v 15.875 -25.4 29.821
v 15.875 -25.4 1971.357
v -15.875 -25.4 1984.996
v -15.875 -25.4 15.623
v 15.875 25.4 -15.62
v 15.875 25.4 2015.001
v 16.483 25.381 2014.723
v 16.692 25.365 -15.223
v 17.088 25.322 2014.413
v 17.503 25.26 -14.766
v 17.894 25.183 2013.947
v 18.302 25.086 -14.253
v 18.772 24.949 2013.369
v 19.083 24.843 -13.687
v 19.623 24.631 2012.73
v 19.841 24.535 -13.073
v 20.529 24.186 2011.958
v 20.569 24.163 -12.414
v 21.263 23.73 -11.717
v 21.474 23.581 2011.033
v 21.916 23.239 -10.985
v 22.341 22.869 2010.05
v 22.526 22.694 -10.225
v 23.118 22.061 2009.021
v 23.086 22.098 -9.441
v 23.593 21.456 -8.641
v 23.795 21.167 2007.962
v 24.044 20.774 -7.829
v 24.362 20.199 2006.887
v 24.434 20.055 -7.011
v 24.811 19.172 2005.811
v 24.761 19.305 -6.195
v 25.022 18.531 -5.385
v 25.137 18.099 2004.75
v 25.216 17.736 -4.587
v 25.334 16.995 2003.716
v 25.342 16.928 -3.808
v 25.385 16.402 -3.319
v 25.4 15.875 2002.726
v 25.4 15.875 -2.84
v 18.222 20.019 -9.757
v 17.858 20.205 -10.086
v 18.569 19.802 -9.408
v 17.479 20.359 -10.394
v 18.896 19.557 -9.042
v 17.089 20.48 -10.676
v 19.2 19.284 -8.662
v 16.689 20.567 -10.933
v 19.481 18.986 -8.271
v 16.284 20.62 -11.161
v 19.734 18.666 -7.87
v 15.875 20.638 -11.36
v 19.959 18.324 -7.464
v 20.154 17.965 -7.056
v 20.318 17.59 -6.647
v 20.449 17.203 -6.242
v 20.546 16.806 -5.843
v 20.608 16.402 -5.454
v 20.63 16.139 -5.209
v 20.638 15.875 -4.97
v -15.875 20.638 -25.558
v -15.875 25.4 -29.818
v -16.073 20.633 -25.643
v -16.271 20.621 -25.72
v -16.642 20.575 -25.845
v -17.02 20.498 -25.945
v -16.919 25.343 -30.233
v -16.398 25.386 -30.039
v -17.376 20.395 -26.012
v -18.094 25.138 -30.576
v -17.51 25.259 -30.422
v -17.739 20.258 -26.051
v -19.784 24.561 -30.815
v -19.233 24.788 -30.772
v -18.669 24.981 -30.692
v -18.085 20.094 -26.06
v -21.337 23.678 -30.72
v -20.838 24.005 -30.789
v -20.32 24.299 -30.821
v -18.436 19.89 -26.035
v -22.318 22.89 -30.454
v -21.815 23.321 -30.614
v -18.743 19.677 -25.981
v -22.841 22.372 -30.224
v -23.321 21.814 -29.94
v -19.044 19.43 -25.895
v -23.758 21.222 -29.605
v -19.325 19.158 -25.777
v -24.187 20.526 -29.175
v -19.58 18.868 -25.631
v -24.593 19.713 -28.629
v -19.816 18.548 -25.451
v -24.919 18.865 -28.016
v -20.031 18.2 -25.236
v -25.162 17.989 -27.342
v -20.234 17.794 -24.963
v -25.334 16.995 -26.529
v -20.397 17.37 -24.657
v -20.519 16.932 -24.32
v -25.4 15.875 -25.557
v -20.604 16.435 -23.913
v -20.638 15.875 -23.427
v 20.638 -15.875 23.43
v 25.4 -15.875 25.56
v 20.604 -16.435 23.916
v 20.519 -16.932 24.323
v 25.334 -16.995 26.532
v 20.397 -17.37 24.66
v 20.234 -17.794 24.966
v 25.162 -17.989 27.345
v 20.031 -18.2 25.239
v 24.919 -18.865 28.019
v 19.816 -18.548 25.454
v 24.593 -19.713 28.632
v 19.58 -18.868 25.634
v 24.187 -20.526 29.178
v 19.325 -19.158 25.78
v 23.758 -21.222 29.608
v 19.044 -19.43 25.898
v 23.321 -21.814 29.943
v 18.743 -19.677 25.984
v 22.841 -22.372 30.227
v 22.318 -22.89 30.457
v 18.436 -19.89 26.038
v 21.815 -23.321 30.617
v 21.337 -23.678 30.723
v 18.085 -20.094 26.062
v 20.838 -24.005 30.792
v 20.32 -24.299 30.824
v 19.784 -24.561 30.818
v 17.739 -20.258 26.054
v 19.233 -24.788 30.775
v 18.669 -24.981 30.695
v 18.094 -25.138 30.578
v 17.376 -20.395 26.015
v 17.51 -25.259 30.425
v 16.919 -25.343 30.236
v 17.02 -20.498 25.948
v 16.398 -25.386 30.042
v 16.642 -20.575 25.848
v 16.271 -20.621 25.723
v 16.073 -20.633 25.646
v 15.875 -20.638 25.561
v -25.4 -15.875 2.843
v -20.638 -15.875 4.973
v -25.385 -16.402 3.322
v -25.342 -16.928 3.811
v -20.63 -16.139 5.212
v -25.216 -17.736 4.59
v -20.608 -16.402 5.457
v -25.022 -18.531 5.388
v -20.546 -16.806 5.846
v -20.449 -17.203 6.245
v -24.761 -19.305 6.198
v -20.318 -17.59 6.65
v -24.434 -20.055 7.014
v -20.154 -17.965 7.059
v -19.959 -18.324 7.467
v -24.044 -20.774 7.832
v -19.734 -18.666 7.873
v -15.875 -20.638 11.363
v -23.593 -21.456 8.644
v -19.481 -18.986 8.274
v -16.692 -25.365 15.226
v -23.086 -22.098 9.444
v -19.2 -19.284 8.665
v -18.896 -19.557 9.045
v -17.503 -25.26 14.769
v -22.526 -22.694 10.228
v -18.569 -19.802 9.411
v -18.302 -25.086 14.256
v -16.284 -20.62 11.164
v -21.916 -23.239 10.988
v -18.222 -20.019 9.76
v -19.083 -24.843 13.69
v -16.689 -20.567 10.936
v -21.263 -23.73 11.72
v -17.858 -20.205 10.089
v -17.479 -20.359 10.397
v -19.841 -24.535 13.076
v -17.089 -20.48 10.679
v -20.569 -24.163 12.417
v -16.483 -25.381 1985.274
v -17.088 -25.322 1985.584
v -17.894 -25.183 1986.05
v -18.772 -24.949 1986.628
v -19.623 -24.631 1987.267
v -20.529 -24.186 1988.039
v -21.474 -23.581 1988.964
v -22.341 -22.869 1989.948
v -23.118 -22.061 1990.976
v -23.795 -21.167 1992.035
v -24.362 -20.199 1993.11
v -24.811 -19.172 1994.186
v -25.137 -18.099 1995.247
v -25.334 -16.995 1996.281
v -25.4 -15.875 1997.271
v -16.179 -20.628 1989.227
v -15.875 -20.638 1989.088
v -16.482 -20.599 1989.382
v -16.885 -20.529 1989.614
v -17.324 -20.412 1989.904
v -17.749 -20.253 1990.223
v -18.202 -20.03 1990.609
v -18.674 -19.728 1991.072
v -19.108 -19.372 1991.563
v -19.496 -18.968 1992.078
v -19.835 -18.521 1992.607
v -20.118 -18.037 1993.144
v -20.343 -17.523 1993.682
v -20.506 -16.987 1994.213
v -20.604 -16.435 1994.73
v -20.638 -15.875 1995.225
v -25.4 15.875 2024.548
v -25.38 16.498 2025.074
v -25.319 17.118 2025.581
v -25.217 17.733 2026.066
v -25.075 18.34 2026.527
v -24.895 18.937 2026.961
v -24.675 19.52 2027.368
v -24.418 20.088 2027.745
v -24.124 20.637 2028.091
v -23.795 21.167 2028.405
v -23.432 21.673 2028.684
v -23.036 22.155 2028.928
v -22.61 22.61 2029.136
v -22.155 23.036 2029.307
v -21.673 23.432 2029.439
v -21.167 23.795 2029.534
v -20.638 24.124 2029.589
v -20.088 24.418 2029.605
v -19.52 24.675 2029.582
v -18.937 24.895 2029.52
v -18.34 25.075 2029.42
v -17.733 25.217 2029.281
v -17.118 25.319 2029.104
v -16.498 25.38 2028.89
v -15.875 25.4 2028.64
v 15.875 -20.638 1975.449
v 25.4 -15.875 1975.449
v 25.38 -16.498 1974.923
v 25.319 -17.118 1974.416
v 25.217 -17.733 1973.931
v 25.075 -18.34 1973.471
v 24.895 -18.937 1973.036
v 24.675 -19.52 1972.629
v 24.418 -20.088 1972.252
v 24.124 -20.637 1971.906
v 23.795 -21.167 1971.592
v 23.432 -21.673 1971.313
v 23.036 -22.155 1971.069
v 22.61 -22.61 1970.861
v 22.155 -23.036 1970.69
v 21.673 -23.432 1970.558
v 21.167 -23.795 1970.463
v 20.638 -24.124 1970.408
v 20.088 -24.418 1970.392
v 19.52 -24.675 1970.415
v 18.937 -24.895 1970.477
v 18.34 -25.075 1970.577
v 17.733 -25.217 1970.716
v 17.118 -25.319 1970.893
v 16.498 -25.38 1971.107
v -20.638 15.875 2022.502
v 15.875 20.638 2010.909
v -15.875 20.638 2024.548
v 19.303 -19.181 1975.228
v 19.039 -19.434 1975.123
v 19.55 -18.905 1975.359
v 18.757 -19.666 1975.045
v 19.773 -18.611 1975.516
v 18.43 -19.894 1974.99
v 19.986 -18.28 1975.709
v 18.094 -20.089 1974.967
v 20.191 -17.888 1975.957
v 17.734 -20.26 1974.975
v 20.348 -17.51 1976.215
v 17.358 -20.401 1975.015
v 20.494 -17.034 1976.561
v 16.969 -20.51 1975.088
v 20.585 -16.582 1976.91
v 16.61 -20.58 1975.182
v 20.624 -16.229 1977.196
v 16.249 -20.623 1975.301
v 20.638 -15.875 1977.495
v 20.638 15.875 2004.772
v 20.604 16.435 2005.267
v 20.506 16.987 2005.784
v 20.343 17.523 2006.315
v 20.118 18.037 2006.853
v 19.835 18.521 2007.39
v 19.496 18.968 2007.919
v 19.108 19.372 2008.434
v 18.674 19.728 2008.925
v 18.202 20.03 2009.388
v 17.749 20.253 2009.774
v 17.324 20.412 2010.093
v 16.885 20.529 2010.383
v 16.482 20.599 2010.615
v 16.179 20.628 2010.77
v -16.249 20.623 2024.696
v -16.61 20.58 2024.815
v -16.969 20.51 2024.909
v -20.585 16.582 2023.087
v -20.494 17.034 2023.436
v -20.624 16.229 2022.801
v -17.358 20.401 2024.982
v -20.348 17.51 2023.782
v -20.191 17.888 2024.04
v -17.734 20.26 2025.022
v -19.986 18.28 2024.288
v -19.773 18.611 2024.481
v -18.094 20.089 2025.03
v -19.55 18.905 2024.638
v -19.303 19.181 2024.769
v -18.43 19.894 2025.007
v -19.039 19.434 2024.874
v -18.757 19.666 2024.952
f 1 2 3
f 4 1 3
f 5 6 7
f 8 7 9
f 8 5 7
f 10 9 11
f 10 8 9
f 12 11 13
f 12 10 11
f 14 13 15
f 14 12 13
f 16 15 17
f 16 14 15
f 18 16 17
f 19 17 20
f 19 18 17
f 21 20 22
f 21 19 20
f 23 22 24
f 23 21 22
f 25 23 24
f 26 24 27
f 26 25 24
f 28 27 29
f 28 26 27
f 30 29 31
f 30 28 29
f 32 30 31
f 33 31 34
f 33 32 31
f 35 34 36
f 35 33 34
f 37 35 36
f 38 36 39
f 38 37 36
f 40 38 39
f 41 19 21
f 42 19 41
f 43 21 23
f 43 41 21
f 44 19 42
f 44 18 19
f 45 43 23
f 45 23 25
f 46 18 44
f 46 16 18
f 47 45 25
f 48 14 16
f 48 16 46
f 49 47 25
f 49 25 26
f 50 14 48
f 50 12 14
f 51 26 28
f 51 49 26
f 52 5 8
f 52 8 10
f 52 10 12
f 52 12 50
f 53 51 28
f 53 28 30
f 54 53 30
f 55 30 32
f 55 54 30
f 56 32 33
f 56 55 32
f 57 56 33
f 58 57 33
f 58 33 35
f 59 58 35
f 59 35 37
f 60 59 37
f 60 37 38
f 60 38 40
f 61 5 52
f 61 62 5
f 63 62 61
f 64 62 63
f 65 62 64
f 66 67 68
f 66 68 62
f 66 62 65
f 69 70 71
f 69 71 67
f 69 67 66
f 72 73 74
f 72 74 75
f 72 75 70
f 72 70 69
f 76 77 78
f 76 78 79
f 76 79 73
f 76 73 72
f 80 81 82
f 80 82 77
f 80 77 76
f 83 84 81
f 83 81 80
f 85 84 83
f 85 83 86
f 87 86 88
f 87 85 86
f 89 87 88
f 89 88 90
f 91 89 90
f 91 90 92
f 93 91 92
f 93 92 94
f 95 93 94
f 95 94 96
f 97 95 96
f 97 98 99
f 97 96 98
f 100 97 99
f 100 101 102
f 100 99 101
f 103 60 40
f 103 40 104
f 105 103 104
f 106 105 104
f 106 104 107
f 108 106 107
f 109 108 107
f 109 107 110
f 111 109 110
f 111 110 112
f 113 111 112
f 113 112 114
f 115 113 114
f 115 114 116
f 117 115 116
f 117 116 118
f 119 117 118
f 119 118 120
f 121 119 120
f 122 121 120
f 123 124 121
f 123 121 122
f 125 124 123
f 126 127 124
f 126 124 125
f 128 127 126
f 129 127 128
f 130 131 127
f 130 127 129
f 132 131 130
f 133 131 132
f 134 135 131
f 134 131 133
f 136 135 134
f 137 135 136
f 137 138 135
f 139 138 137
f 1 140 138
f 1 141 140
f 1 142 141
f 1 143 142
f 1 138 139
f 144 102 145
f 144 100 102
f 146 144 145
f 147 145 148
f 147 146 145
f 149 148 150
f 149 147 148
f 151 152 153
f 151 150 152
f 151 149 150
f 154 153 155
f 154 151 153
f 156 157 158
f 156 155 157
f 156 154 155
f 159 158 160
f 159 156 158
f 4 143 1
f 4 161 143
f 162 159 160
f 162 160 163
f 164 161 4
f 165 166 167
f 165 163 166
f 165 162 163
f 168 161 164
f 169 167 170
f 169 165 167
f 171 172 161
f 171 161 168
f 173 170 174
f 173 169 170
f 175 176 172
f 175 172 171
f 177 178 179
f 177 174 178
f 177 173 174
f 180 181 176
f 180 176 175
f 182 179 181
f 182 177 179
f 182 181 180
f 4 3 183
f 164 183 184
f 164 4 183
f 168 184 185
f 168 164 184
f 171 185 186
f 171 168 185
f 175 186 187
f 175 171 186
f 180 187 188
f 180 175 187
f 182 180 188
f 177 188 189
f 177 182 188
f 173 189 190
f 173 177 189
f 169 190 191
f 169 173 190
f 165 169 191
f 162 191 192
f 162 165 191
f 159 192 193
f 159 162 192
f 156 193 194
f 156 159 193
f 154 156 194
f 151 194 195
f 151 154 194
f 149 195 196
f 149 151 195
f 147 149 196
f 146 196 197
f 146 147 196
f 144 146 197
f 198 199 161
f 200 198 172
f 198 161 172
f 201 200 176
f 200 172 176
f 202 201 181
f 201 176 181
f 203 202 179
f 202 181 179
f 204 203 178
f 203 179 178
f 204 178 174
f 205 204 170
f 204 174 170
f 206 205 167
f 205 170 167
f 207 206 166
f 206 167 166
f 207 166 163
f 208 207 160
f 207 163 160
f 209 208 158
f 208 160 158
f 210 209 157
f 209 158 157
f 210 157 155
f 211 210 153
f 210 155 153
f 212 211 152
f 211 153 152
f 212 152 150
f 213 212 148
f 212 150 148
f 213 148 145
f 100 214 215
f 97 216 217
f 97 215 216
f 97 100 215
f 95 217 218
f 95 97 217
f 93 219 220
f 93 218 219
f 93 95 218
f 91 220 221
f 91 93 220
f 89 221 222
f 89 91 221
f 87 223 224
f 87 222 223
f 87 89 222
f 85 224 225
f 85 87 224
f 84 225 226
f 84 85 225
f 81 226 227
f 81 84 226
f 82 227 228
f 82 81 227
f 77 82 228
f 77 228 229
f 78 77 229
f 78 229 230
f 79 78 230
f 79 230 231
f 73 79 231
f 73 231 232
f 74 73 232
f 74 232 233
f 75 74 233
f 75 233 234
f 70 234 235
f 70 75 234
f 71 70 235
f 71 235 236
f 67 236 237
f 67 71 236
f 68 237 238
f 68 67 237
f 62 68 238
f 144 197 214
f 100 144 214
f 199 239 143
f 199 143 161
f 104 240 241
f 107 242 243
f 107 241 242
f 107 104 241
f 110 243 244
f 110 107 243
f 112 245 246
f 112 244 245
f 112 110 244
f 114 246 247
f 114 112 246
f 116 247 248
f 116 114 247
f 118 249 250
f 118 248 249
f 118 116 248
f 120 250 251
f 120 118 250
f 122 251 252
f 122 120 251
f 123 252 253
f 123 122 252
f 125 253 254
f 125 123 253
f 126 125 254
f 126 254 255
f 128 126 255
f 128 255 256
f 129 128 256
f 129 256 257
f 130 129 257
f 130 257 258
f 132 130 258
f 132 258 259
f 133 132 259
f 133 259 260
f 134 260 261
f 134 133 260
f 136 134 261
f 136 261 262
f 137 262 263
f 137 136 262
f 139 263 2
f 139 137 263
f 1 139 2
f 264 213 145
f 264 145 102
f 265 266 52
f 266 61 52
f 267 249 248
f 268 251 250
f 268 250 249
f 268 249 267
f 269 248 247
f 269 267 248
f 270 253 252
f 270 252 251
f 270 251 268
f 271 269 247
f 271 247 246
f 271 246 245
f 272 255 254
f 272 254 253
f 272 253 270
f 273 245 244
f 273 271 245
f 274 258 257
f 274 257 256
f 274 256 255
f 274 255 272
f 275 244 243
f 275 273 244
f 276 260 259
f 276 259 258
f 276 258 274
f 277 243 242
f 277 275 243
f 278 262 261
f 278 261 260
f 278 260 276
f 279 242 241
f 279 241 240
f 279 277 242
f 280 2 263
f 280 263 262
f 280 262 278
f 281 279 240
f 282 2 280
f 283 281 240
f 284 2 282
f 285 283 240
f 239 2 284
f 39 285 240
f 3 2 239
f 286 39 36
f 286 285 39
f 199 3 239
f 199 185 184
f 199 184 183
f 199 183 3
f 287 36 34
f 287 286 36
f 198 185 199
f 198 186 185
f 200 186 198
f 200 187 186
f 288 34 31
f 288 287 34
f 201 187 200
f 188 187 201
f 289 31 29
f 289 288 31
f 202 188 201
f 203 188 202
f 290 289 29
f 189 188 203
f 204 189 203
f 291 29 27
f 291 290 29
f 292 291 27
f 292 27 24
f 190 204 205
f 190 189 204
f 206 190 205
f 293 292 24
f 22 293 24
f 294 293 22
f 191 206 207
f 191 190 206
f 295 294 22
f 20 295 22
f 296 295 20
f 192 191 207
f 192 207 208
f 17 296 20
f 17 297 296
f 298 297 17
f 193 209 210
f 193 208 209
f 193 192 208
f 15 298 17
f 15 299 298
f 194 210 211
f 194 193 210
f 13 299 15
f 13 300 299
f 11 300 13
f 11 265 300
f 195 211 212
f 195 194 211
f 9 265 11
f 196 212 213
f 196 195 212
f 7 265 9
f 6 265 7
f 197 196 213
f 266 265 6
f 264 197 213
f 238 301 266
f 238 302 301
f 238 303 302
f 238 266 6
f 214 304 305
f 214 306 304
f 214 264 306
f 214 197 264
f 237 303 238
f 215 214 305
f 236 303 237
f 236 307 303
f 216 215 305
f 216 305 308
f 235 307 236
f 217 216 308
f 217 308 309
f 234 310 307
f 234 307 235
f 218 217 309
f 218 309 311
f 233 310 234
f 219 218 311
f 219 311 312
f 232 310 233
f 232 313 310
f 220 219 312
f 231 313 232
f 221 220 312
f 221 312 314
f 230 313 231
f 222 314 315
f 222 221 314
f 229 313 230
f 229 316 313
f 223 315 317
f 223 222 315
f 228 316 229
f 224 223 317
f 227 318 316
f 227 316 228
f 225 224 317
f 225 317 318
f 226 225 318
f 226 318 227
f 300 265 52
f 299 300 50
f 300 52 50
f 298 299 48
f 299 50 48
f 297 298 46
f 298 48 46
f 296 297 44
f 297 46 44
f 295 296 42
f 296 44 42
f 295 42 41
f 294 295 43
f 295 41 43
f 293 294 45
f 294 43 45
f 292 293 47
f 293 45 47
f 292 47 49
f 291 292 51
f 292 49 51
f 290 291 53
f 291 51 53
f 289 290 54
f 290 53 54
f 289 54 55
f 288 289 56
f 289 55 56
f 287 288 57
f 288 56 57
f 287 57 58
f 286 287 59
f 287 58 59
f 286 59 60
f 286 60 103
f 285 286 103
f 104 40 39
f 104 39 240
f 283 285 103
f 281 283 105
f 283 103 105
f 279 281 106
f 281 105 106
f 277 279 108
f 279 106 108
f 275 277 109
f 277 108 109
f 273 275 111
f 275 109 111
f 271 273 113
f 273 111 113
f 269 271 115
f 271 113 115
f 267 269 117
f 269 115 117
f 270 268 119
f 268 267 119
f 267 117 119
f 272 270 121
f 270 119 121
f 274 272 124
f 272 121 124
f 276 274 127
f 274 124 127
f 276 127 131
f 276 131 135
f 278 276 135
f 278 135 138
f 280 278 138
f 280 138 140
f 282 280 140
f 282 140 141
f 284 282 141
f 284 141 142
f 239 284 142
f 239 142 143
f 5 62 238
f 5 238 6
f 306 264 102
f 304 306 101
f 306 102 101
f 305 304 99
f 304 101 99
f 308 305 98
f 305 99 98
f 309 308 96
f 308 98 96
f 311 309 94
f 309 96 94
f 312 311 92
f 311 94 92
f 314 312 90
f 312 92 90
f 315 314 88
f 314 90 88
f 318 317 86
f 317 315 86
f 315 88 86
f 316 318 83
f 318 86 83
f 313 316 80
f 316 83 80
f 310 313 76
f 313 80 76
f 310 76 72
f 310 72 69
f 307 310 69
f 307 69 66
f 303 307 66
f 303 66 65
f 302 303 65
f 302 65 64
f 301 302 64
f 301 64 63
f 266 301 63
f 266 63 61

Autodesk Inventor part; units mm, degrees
ref_plane "Plano inicial" through (0, 0, -34.0777) normal (0, 0, 1) x (1, 0, 0)
ref_plane "Plano final" through (0, 0, 2032.731) normal (0, 0, 1) x (1, 0, 0)
sketch "Esboço" plane through (0, 0, 0) normal (0, 0, 1) x (1, 0, 0)
  line L0 (-25.4, -15.875) -> (-25.4, 15.875)
  line L1 (-15.875, 25.4) -> (15.875, 25.4)
  line L2 (25.4, 15.875) -> (25.4, -15.875)
  line L3 (15.875, -25.4) -> (-15.875, -25.4)
  arc A0 (-25.4, -15.875) -> (-15.875, -25.4) centre (-15.875, -15.875) ccw
  arc A1 (-15.875, 25.4) -> (-25.4, 15.875) centre (-15.875, 15.875) ccw
  arc A2 (25.4, 15.875) -> (15.875, 25.4) centre (15.875, 15.875) ccw
  arc A3 (15.875, -25.4) -> (25.4, -15.875) centre (15.875, -15.875) ccw
  arc A4 (-15.875, 20.6375) -> (-20.6375, 15.875) centre (-15.875, 15.875) ccw
  line L4 (-15.875, 20.6375) -> (15.875, 20.6375)
  arc A5 (20.6375, 15.875) -> (15.875, 20.6375) centre (15.875, 15.875) ccw
  line L5 (20.6375, 15.875) -> (20.6375, -15.875)
  arc A6 (15.875, -20.6375) -> (20.6375, -15.875) centre (15.875, -15.875) ccw
  line L6 (15.875, -20.6375) -> (-15.875, -20.6375)
  arc A7 (-20.6375, -15.875) -> (-15.875, -20.6375) centre (-15.875, -15.875) ccw
  line L7 (-20.6375, -15.875) -> (-20.6375, 15.875)
  line L8 (0, 38.3218) -> (0, -38.3218) construction
  line L9 (-38.3218, 0) -> (38.3218, 0) construction
  dimension "d10" = 50.8
  dimension "d11" = 50.8
  dimension "d12" = 4.7625
  dimension "d15" = 25.4
  dimension "d16" = 25.4
  dimension "d17" = 9.525
extrude "Corpo" add sketch "Esboço" along normal up to surface (2066.8087 mm away) from surface at -34.0777
sketch "Sketch3" plane through (0, 0, 0) normal (0, 0, 1) x (1, 0, 0)
  line L0 (0, 0) -> (10, 0)
ref_plane "Work Plane3" through (0, 0, 0) normal (0, -1, 0) x (1, 0, 0)
sketch "Sketch4" plane through (0, 0, 0) normal (0, -1, 0) x (1, 0, 0)
  line L0 (-2, -34.0777) -> (12, -34.0777)
  line L1 (-2, 2032.731) -> (12, 2032.731)
  dimension "d19" = 2066.8087
ref_plane "Plano de trabalho4" through (-13.7846, 27.5692, -30.8233) normal (0.3162, -0.6325, -0.7071) x (0.6586, 0.6828, -0.3162)
split "Dividir1" plane through (-13.7846, 27.5692, -30.8233) removes the side toward (0.3162, -0.6325, -0.7071)
ref_plane "Plano de trabalho5" through (-13.7846, 27.5692, 2029.6052) normal (0.3098, -0.6196, 0.7212) x (0.9442, 0.1115, -0.3098)
split "Dividir2" plane through (-13.7846, 27.5692, 2029.6052) removes the side toward (0.3098, -0.6196, 0.7212)
equation "\"d10\" = G_H"
equation "\"d11\" = G_W"
equation "\"d12\" = G_T"
equation "\"d15\" = 0.5 * d10"
equation "\"d16\" = 0.5 * d11"
equation "\"d17\" = G_IR"
equation "\"d3\" = G_L"
equation "\"G_W\" = 50.8"
equation "\"G_H\" = 50.8"
equation "\"G_T\" = 4.7625"
equation "\"G_IR\" = 9.525"
equation "\"G_L\" = 2060.38202"
equation "\"G_OFFSET_START\" = 34.07768"
equation "\"G_OFFSET_END\" = 32.73098"
equation "\"d13\" = -G_OFFSET_START"
equation "\"d14\" = G_OFFSET_END + B_L"
equation "\"B_L\" = 2000"
properties part number "AISC - 2 x 2 x 3/16 - 81,117" material "Aço, suave"
